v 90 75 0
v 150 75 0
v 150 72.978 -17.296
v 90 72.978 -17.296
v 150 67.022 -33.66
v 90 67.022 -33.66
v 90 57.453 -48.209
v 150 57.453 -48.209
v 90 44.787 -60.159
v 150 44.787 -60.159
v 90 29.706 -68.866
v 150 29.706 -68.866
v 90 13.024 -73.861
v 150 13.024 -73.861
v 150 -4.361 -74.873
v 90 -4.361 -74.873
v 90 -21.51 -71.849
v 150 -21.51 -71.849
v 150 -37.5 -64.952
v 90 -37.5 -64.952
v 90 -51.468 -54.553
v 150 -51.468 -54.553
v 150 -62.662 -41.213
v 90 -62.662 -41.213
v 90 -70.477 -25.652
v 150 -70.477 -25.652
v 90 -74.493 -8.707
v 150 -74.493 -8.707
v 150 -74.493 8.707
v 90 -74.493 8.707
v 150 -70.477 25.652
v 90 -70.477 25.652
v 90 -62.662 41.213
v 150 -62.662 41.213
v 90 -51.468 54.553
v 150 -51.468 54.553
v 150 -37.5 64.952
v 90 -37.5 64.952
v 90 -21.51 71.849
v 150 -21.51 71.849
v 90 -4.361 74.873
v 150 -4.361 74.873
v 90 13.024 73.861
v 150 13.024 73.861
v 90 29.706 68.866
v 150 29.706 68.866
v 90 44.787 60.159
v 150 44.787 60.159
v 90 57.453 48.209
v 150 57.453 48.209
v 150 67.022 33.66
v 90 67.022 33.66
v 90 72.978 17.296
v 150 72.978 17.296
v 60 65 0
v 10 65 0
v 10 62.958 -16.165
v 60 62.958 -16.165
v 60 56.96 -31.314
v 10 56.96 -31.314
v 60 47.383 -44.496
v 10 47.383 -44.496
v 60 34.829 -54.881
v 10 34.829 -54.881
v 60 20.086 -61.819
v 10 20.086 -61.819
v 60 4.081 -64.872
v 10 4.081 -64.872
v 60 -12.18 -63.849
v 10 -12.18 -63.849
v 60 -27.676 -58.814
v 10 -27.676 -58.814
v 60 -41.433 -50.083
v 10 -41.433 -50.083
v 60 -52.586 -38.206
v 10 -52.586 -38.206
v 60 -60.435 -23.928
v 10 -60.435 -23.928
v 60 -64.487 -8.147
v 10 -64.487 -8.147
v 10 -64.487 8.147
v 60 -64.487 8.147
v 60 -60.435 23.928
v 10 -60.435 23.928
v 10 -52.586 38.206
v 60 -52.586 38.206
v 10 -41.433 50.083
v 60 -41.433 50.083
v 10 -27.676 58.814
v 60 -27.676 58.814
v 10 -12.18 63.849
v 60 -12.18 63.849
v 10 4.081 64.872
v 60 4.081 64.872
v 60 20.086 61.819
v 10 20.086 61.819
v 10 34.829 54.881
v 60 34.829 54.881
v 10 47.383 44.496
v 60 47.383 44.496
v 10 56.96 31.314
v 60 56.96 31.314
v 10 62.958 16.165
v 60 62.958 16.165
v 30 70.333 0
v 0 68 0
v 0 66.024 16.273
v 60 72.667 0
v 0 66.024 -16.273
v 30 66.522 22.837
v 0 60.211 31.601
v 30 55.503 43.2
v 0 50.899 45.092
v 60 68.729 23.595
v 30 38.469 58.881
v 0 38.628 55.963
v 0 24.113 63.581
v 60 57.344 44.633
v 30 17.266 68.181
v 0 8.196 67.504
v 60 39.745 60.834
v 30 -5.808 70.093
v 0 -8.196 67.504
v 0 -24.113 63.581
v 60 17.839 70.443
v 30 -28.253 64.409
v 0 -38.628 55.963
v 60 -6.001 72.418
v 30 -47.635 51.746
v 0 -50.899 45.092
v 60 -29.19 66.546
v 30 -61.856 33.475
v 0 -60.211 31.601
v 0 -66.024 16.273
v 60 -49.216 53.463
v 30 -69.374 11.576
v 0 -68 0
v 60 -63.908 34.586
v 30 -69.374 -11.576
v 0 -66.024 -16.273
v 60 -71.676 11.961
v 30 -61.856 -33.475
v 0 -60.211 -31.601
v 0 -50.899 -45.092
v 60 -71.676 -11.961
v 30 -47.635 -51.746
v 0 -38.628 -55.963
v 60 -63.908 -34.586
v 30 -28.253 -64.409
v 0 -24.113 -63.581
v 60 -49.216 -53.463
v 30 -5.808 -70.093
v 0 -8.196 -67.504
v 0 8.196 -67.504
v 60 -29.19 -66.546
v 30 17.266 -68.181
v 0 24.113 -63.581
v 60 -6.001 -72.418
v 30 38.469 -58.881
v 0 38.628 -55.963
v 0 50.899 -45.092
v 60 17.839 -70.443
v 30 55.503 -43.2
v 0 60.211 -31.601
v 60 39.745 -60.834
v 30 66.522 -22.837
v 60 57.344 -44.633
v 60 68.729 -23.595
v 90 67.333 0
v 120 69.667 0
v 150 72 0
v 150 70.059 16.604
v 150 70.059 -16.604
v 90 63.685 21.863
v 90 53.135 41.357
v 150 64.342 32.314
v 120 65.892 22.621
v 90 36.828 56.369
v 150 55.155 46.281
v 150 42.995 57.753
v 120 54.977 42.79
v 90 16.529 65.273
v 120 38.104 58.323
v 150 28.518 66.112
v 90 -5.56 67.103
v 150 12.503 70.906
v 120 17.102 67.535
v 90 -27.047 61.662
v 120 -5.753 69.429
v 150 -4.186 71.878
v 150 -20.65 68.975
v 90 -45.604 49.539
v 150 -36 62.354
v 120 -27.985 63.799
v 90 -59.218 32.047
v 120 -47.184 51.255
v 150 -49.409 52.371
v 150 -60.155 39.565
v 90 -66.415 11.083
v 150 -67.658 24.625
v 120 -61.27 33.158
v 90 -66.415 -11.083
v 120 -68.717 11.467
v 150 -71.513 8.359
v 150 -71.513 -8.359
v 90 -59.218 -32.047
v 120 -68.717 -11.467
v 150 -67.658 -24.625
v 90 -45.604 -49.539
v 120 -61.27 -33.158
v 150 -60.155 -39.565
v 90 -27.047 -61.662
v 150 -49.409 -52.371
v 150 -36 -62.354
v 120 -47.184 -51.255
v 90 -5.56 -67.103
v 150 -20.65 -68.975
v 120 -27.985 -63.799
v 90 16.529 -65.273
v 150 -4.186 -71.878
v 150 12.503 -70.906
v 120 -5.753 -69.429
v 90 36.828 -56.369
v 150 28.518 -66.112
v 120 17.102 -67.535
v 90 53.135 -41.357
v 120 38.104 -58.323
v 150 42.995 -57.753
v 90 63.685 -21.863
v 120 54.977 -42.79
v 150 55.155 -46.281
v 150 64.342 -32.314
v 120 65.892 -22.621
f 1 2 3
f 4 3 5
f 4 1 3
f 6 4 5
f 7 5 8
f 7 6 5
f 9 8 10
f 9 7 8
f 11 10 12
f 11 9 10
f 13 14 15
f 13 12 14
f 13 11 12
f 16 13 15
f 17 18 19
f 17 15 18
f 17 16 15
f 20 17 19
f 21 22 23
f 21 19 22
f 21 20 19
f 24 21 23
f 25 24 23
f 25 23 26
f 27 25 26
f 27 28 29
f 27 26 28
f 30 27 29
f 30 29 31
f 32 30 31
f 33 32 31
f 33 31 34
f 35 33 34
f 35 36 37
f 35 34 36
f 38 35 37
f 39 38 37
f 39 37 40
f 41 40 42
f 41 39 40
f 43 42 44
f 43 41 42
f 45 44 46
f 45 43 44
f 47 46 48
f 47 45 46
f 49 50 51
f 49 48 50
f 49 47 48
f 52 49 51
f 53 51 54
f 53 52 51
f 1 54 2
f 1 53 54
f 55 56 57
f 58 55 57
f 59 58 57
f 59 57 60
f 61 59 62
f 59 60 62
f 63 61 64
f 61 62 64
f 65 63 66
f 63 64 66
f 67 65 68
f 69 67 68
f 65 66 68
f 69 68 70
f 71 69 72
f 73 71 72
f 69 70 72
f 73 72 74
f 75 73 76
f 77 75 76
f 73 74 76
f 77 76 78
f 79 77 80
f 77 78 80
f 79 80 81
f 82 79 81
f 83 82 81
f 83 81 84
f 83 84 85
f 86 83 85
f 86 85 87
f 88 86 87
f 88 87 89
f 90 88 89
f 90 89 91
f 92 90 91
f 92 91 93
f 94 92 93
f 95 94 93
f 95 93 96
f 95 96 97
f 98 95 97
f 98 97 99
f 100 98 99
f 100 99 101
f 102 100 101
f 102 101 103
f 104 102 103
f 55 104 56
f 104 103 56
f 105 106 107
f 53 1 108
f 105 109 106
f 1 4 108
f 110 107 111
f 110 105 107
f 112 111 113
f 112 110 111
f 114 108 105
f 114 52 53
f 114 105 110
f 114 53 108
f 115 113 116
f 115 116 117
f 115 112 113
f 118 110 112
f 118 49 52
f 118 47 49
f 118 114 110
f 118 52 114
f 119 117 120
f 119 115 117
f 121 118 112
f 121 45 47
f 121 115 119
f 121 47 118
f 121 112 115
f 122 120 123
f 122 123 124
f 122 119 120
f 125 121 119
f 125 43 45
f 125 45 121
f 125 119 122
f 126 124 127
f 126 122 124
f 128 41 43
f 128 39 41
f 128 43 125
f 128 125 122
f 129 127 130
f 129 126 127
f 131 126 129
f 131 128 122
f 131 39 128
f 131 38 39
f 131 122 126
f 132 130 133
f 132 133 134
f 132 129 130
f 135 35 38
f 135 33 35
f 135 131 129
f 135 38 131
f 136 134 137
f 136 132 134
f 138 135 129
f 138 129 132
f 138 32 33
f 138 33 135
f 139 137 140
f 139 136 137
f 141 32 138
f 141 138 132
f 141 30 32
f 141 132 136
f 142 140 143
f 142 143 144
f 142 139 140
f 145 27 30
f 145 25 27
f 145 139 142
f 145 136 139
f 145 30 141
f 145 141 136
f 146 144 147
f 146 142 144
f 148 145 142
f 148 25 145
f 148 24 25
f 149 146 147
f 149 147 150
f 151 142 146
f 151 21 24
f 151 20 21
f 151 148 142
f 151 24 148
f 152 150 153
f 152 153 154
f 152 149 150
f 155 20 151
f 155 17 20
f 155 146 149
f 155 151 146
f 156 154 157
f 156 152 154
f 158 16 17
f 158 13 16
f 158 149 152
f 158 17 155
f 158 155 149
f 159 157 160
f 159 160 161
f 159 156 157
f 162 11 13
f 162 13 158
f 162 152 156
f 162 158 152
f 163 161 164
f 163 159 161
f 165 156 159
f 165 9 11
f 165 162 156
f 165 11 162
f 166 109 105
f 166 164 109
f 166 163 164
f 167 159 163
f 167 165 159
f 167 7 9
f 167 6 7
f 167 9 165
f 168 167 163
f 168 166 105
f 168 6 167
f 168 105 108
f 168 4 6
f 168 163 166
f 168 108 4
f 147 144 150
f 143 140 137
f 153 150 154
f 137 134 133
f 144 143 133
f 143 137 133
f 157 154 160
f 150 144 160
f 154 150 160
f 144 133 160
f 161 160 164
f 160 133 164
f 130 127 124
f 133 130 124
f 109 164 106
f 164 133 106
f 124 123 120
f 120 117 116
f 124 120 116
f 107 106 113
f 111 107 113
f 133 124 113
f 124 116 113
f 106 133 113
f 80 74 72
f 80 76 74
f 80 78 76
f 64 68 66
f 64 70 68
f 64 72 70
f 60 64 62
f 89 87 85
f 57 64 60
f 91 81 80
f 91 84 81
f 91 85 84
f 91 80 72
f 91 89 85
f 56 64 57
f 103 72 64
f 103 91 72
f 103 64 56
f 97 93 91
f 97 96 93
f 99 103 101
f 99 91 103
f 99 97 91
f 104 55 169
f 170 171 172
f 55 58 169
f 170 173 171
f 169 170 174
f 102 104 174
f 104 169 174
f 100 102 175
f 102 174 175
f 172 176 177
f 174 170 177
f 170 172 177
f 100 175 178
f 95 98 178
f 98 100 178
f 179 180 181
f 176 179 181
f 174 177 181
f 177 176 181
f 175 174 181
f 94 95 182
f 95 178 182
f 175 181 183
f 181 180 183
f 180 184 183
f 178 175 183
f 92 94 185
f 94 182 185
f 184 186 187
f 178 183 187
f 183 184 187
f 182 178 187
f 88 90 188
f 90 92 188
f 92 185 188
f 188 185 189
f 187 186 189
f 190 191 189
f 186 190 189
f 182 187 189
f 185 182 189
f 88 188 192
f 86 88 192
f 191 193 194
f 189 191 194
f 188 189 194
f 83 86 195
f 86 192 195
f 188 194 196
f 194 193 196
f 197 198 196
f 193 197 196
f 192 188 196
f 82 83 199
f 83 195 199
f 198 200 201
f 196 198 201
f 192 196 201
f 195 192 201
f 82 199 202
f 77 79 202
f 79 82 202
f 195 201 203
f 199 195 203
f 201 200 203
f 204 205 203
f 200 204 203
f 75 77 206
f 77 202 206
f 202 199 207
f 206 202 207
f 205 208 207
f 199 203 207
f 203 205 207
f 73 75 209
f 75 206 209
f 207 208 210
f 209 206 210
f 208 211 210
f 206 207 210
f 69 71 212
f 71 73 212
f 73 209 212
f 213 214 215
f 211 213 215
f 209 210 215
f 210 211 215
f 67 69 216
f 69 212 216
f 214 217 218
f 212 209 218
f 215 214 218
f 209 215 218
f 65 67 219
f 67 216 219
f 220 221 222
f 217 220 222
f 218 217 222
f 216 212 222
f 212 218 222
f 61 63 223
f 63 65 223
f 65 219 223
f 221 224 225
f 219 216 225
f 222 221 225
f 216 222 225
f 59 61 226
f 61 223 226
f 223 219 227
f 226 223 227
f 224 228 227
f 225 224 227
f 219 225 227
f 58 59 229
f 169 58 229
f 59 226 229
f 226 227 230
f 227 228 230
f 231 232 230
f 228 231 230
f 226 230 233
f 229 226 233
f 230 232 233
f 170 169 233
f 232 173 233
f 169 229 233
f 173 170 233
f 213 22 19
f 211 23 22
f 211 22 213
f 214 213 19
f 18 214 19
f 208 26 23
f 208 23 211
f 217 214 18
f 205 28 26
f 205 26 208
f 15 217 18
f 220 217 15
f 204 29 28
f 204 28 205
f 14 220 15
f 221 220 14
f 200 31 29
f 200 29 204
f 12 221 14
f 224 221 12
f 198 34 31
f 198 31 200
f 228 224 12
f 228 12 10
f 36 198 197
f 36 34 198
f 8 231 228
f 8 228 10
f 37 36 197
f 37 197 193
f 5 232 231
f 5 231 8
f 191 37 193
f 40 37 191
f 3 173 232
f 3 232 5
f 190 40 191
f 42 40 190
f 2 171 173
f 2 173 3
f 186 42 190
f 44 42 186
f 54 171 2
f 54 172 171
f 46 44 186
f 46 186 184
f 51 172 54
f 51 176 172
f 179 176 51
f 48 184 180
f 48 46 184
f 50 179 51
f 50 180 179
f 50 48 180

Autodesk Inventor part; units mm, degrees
ref_plane "YZ Plane" through (0, 0, 0) normal (1, 0, 0) x (0, 1, 0)
ref_plane "XZ Plane" through (0, 0, 0) normal (0, 1, 0) x (-1, 0, 0)
ref_plane "XY Plane" through (0, 0, 0) normal (0, 0, 1) x (1, 0, 0)
sketch "Skizze1" plane through (0, 0, 0) normal (1, 0, 0) x (0, 1, 0)
  circle A0 centre (0, 0) radius 75
  dimension "d0" = 150
extrude "Extrusion1" add sketch "Skizze1" along normal blind 150
shell "Wandung1" thickness 10 removed faces 1 at (150, 17.7208, 28.0232)
chamfer "Fase1" distance 7 distance2 90 1 edges at (150, -65, 0) measured on face at (150, -32.1985, -63.7899)
chamfer "Fase2" distance 7 distance2 90 1 edges at (0, -75, 0) measured on face at (0, 17.7208, 28.0232)
properties part number "Blumentopf"
